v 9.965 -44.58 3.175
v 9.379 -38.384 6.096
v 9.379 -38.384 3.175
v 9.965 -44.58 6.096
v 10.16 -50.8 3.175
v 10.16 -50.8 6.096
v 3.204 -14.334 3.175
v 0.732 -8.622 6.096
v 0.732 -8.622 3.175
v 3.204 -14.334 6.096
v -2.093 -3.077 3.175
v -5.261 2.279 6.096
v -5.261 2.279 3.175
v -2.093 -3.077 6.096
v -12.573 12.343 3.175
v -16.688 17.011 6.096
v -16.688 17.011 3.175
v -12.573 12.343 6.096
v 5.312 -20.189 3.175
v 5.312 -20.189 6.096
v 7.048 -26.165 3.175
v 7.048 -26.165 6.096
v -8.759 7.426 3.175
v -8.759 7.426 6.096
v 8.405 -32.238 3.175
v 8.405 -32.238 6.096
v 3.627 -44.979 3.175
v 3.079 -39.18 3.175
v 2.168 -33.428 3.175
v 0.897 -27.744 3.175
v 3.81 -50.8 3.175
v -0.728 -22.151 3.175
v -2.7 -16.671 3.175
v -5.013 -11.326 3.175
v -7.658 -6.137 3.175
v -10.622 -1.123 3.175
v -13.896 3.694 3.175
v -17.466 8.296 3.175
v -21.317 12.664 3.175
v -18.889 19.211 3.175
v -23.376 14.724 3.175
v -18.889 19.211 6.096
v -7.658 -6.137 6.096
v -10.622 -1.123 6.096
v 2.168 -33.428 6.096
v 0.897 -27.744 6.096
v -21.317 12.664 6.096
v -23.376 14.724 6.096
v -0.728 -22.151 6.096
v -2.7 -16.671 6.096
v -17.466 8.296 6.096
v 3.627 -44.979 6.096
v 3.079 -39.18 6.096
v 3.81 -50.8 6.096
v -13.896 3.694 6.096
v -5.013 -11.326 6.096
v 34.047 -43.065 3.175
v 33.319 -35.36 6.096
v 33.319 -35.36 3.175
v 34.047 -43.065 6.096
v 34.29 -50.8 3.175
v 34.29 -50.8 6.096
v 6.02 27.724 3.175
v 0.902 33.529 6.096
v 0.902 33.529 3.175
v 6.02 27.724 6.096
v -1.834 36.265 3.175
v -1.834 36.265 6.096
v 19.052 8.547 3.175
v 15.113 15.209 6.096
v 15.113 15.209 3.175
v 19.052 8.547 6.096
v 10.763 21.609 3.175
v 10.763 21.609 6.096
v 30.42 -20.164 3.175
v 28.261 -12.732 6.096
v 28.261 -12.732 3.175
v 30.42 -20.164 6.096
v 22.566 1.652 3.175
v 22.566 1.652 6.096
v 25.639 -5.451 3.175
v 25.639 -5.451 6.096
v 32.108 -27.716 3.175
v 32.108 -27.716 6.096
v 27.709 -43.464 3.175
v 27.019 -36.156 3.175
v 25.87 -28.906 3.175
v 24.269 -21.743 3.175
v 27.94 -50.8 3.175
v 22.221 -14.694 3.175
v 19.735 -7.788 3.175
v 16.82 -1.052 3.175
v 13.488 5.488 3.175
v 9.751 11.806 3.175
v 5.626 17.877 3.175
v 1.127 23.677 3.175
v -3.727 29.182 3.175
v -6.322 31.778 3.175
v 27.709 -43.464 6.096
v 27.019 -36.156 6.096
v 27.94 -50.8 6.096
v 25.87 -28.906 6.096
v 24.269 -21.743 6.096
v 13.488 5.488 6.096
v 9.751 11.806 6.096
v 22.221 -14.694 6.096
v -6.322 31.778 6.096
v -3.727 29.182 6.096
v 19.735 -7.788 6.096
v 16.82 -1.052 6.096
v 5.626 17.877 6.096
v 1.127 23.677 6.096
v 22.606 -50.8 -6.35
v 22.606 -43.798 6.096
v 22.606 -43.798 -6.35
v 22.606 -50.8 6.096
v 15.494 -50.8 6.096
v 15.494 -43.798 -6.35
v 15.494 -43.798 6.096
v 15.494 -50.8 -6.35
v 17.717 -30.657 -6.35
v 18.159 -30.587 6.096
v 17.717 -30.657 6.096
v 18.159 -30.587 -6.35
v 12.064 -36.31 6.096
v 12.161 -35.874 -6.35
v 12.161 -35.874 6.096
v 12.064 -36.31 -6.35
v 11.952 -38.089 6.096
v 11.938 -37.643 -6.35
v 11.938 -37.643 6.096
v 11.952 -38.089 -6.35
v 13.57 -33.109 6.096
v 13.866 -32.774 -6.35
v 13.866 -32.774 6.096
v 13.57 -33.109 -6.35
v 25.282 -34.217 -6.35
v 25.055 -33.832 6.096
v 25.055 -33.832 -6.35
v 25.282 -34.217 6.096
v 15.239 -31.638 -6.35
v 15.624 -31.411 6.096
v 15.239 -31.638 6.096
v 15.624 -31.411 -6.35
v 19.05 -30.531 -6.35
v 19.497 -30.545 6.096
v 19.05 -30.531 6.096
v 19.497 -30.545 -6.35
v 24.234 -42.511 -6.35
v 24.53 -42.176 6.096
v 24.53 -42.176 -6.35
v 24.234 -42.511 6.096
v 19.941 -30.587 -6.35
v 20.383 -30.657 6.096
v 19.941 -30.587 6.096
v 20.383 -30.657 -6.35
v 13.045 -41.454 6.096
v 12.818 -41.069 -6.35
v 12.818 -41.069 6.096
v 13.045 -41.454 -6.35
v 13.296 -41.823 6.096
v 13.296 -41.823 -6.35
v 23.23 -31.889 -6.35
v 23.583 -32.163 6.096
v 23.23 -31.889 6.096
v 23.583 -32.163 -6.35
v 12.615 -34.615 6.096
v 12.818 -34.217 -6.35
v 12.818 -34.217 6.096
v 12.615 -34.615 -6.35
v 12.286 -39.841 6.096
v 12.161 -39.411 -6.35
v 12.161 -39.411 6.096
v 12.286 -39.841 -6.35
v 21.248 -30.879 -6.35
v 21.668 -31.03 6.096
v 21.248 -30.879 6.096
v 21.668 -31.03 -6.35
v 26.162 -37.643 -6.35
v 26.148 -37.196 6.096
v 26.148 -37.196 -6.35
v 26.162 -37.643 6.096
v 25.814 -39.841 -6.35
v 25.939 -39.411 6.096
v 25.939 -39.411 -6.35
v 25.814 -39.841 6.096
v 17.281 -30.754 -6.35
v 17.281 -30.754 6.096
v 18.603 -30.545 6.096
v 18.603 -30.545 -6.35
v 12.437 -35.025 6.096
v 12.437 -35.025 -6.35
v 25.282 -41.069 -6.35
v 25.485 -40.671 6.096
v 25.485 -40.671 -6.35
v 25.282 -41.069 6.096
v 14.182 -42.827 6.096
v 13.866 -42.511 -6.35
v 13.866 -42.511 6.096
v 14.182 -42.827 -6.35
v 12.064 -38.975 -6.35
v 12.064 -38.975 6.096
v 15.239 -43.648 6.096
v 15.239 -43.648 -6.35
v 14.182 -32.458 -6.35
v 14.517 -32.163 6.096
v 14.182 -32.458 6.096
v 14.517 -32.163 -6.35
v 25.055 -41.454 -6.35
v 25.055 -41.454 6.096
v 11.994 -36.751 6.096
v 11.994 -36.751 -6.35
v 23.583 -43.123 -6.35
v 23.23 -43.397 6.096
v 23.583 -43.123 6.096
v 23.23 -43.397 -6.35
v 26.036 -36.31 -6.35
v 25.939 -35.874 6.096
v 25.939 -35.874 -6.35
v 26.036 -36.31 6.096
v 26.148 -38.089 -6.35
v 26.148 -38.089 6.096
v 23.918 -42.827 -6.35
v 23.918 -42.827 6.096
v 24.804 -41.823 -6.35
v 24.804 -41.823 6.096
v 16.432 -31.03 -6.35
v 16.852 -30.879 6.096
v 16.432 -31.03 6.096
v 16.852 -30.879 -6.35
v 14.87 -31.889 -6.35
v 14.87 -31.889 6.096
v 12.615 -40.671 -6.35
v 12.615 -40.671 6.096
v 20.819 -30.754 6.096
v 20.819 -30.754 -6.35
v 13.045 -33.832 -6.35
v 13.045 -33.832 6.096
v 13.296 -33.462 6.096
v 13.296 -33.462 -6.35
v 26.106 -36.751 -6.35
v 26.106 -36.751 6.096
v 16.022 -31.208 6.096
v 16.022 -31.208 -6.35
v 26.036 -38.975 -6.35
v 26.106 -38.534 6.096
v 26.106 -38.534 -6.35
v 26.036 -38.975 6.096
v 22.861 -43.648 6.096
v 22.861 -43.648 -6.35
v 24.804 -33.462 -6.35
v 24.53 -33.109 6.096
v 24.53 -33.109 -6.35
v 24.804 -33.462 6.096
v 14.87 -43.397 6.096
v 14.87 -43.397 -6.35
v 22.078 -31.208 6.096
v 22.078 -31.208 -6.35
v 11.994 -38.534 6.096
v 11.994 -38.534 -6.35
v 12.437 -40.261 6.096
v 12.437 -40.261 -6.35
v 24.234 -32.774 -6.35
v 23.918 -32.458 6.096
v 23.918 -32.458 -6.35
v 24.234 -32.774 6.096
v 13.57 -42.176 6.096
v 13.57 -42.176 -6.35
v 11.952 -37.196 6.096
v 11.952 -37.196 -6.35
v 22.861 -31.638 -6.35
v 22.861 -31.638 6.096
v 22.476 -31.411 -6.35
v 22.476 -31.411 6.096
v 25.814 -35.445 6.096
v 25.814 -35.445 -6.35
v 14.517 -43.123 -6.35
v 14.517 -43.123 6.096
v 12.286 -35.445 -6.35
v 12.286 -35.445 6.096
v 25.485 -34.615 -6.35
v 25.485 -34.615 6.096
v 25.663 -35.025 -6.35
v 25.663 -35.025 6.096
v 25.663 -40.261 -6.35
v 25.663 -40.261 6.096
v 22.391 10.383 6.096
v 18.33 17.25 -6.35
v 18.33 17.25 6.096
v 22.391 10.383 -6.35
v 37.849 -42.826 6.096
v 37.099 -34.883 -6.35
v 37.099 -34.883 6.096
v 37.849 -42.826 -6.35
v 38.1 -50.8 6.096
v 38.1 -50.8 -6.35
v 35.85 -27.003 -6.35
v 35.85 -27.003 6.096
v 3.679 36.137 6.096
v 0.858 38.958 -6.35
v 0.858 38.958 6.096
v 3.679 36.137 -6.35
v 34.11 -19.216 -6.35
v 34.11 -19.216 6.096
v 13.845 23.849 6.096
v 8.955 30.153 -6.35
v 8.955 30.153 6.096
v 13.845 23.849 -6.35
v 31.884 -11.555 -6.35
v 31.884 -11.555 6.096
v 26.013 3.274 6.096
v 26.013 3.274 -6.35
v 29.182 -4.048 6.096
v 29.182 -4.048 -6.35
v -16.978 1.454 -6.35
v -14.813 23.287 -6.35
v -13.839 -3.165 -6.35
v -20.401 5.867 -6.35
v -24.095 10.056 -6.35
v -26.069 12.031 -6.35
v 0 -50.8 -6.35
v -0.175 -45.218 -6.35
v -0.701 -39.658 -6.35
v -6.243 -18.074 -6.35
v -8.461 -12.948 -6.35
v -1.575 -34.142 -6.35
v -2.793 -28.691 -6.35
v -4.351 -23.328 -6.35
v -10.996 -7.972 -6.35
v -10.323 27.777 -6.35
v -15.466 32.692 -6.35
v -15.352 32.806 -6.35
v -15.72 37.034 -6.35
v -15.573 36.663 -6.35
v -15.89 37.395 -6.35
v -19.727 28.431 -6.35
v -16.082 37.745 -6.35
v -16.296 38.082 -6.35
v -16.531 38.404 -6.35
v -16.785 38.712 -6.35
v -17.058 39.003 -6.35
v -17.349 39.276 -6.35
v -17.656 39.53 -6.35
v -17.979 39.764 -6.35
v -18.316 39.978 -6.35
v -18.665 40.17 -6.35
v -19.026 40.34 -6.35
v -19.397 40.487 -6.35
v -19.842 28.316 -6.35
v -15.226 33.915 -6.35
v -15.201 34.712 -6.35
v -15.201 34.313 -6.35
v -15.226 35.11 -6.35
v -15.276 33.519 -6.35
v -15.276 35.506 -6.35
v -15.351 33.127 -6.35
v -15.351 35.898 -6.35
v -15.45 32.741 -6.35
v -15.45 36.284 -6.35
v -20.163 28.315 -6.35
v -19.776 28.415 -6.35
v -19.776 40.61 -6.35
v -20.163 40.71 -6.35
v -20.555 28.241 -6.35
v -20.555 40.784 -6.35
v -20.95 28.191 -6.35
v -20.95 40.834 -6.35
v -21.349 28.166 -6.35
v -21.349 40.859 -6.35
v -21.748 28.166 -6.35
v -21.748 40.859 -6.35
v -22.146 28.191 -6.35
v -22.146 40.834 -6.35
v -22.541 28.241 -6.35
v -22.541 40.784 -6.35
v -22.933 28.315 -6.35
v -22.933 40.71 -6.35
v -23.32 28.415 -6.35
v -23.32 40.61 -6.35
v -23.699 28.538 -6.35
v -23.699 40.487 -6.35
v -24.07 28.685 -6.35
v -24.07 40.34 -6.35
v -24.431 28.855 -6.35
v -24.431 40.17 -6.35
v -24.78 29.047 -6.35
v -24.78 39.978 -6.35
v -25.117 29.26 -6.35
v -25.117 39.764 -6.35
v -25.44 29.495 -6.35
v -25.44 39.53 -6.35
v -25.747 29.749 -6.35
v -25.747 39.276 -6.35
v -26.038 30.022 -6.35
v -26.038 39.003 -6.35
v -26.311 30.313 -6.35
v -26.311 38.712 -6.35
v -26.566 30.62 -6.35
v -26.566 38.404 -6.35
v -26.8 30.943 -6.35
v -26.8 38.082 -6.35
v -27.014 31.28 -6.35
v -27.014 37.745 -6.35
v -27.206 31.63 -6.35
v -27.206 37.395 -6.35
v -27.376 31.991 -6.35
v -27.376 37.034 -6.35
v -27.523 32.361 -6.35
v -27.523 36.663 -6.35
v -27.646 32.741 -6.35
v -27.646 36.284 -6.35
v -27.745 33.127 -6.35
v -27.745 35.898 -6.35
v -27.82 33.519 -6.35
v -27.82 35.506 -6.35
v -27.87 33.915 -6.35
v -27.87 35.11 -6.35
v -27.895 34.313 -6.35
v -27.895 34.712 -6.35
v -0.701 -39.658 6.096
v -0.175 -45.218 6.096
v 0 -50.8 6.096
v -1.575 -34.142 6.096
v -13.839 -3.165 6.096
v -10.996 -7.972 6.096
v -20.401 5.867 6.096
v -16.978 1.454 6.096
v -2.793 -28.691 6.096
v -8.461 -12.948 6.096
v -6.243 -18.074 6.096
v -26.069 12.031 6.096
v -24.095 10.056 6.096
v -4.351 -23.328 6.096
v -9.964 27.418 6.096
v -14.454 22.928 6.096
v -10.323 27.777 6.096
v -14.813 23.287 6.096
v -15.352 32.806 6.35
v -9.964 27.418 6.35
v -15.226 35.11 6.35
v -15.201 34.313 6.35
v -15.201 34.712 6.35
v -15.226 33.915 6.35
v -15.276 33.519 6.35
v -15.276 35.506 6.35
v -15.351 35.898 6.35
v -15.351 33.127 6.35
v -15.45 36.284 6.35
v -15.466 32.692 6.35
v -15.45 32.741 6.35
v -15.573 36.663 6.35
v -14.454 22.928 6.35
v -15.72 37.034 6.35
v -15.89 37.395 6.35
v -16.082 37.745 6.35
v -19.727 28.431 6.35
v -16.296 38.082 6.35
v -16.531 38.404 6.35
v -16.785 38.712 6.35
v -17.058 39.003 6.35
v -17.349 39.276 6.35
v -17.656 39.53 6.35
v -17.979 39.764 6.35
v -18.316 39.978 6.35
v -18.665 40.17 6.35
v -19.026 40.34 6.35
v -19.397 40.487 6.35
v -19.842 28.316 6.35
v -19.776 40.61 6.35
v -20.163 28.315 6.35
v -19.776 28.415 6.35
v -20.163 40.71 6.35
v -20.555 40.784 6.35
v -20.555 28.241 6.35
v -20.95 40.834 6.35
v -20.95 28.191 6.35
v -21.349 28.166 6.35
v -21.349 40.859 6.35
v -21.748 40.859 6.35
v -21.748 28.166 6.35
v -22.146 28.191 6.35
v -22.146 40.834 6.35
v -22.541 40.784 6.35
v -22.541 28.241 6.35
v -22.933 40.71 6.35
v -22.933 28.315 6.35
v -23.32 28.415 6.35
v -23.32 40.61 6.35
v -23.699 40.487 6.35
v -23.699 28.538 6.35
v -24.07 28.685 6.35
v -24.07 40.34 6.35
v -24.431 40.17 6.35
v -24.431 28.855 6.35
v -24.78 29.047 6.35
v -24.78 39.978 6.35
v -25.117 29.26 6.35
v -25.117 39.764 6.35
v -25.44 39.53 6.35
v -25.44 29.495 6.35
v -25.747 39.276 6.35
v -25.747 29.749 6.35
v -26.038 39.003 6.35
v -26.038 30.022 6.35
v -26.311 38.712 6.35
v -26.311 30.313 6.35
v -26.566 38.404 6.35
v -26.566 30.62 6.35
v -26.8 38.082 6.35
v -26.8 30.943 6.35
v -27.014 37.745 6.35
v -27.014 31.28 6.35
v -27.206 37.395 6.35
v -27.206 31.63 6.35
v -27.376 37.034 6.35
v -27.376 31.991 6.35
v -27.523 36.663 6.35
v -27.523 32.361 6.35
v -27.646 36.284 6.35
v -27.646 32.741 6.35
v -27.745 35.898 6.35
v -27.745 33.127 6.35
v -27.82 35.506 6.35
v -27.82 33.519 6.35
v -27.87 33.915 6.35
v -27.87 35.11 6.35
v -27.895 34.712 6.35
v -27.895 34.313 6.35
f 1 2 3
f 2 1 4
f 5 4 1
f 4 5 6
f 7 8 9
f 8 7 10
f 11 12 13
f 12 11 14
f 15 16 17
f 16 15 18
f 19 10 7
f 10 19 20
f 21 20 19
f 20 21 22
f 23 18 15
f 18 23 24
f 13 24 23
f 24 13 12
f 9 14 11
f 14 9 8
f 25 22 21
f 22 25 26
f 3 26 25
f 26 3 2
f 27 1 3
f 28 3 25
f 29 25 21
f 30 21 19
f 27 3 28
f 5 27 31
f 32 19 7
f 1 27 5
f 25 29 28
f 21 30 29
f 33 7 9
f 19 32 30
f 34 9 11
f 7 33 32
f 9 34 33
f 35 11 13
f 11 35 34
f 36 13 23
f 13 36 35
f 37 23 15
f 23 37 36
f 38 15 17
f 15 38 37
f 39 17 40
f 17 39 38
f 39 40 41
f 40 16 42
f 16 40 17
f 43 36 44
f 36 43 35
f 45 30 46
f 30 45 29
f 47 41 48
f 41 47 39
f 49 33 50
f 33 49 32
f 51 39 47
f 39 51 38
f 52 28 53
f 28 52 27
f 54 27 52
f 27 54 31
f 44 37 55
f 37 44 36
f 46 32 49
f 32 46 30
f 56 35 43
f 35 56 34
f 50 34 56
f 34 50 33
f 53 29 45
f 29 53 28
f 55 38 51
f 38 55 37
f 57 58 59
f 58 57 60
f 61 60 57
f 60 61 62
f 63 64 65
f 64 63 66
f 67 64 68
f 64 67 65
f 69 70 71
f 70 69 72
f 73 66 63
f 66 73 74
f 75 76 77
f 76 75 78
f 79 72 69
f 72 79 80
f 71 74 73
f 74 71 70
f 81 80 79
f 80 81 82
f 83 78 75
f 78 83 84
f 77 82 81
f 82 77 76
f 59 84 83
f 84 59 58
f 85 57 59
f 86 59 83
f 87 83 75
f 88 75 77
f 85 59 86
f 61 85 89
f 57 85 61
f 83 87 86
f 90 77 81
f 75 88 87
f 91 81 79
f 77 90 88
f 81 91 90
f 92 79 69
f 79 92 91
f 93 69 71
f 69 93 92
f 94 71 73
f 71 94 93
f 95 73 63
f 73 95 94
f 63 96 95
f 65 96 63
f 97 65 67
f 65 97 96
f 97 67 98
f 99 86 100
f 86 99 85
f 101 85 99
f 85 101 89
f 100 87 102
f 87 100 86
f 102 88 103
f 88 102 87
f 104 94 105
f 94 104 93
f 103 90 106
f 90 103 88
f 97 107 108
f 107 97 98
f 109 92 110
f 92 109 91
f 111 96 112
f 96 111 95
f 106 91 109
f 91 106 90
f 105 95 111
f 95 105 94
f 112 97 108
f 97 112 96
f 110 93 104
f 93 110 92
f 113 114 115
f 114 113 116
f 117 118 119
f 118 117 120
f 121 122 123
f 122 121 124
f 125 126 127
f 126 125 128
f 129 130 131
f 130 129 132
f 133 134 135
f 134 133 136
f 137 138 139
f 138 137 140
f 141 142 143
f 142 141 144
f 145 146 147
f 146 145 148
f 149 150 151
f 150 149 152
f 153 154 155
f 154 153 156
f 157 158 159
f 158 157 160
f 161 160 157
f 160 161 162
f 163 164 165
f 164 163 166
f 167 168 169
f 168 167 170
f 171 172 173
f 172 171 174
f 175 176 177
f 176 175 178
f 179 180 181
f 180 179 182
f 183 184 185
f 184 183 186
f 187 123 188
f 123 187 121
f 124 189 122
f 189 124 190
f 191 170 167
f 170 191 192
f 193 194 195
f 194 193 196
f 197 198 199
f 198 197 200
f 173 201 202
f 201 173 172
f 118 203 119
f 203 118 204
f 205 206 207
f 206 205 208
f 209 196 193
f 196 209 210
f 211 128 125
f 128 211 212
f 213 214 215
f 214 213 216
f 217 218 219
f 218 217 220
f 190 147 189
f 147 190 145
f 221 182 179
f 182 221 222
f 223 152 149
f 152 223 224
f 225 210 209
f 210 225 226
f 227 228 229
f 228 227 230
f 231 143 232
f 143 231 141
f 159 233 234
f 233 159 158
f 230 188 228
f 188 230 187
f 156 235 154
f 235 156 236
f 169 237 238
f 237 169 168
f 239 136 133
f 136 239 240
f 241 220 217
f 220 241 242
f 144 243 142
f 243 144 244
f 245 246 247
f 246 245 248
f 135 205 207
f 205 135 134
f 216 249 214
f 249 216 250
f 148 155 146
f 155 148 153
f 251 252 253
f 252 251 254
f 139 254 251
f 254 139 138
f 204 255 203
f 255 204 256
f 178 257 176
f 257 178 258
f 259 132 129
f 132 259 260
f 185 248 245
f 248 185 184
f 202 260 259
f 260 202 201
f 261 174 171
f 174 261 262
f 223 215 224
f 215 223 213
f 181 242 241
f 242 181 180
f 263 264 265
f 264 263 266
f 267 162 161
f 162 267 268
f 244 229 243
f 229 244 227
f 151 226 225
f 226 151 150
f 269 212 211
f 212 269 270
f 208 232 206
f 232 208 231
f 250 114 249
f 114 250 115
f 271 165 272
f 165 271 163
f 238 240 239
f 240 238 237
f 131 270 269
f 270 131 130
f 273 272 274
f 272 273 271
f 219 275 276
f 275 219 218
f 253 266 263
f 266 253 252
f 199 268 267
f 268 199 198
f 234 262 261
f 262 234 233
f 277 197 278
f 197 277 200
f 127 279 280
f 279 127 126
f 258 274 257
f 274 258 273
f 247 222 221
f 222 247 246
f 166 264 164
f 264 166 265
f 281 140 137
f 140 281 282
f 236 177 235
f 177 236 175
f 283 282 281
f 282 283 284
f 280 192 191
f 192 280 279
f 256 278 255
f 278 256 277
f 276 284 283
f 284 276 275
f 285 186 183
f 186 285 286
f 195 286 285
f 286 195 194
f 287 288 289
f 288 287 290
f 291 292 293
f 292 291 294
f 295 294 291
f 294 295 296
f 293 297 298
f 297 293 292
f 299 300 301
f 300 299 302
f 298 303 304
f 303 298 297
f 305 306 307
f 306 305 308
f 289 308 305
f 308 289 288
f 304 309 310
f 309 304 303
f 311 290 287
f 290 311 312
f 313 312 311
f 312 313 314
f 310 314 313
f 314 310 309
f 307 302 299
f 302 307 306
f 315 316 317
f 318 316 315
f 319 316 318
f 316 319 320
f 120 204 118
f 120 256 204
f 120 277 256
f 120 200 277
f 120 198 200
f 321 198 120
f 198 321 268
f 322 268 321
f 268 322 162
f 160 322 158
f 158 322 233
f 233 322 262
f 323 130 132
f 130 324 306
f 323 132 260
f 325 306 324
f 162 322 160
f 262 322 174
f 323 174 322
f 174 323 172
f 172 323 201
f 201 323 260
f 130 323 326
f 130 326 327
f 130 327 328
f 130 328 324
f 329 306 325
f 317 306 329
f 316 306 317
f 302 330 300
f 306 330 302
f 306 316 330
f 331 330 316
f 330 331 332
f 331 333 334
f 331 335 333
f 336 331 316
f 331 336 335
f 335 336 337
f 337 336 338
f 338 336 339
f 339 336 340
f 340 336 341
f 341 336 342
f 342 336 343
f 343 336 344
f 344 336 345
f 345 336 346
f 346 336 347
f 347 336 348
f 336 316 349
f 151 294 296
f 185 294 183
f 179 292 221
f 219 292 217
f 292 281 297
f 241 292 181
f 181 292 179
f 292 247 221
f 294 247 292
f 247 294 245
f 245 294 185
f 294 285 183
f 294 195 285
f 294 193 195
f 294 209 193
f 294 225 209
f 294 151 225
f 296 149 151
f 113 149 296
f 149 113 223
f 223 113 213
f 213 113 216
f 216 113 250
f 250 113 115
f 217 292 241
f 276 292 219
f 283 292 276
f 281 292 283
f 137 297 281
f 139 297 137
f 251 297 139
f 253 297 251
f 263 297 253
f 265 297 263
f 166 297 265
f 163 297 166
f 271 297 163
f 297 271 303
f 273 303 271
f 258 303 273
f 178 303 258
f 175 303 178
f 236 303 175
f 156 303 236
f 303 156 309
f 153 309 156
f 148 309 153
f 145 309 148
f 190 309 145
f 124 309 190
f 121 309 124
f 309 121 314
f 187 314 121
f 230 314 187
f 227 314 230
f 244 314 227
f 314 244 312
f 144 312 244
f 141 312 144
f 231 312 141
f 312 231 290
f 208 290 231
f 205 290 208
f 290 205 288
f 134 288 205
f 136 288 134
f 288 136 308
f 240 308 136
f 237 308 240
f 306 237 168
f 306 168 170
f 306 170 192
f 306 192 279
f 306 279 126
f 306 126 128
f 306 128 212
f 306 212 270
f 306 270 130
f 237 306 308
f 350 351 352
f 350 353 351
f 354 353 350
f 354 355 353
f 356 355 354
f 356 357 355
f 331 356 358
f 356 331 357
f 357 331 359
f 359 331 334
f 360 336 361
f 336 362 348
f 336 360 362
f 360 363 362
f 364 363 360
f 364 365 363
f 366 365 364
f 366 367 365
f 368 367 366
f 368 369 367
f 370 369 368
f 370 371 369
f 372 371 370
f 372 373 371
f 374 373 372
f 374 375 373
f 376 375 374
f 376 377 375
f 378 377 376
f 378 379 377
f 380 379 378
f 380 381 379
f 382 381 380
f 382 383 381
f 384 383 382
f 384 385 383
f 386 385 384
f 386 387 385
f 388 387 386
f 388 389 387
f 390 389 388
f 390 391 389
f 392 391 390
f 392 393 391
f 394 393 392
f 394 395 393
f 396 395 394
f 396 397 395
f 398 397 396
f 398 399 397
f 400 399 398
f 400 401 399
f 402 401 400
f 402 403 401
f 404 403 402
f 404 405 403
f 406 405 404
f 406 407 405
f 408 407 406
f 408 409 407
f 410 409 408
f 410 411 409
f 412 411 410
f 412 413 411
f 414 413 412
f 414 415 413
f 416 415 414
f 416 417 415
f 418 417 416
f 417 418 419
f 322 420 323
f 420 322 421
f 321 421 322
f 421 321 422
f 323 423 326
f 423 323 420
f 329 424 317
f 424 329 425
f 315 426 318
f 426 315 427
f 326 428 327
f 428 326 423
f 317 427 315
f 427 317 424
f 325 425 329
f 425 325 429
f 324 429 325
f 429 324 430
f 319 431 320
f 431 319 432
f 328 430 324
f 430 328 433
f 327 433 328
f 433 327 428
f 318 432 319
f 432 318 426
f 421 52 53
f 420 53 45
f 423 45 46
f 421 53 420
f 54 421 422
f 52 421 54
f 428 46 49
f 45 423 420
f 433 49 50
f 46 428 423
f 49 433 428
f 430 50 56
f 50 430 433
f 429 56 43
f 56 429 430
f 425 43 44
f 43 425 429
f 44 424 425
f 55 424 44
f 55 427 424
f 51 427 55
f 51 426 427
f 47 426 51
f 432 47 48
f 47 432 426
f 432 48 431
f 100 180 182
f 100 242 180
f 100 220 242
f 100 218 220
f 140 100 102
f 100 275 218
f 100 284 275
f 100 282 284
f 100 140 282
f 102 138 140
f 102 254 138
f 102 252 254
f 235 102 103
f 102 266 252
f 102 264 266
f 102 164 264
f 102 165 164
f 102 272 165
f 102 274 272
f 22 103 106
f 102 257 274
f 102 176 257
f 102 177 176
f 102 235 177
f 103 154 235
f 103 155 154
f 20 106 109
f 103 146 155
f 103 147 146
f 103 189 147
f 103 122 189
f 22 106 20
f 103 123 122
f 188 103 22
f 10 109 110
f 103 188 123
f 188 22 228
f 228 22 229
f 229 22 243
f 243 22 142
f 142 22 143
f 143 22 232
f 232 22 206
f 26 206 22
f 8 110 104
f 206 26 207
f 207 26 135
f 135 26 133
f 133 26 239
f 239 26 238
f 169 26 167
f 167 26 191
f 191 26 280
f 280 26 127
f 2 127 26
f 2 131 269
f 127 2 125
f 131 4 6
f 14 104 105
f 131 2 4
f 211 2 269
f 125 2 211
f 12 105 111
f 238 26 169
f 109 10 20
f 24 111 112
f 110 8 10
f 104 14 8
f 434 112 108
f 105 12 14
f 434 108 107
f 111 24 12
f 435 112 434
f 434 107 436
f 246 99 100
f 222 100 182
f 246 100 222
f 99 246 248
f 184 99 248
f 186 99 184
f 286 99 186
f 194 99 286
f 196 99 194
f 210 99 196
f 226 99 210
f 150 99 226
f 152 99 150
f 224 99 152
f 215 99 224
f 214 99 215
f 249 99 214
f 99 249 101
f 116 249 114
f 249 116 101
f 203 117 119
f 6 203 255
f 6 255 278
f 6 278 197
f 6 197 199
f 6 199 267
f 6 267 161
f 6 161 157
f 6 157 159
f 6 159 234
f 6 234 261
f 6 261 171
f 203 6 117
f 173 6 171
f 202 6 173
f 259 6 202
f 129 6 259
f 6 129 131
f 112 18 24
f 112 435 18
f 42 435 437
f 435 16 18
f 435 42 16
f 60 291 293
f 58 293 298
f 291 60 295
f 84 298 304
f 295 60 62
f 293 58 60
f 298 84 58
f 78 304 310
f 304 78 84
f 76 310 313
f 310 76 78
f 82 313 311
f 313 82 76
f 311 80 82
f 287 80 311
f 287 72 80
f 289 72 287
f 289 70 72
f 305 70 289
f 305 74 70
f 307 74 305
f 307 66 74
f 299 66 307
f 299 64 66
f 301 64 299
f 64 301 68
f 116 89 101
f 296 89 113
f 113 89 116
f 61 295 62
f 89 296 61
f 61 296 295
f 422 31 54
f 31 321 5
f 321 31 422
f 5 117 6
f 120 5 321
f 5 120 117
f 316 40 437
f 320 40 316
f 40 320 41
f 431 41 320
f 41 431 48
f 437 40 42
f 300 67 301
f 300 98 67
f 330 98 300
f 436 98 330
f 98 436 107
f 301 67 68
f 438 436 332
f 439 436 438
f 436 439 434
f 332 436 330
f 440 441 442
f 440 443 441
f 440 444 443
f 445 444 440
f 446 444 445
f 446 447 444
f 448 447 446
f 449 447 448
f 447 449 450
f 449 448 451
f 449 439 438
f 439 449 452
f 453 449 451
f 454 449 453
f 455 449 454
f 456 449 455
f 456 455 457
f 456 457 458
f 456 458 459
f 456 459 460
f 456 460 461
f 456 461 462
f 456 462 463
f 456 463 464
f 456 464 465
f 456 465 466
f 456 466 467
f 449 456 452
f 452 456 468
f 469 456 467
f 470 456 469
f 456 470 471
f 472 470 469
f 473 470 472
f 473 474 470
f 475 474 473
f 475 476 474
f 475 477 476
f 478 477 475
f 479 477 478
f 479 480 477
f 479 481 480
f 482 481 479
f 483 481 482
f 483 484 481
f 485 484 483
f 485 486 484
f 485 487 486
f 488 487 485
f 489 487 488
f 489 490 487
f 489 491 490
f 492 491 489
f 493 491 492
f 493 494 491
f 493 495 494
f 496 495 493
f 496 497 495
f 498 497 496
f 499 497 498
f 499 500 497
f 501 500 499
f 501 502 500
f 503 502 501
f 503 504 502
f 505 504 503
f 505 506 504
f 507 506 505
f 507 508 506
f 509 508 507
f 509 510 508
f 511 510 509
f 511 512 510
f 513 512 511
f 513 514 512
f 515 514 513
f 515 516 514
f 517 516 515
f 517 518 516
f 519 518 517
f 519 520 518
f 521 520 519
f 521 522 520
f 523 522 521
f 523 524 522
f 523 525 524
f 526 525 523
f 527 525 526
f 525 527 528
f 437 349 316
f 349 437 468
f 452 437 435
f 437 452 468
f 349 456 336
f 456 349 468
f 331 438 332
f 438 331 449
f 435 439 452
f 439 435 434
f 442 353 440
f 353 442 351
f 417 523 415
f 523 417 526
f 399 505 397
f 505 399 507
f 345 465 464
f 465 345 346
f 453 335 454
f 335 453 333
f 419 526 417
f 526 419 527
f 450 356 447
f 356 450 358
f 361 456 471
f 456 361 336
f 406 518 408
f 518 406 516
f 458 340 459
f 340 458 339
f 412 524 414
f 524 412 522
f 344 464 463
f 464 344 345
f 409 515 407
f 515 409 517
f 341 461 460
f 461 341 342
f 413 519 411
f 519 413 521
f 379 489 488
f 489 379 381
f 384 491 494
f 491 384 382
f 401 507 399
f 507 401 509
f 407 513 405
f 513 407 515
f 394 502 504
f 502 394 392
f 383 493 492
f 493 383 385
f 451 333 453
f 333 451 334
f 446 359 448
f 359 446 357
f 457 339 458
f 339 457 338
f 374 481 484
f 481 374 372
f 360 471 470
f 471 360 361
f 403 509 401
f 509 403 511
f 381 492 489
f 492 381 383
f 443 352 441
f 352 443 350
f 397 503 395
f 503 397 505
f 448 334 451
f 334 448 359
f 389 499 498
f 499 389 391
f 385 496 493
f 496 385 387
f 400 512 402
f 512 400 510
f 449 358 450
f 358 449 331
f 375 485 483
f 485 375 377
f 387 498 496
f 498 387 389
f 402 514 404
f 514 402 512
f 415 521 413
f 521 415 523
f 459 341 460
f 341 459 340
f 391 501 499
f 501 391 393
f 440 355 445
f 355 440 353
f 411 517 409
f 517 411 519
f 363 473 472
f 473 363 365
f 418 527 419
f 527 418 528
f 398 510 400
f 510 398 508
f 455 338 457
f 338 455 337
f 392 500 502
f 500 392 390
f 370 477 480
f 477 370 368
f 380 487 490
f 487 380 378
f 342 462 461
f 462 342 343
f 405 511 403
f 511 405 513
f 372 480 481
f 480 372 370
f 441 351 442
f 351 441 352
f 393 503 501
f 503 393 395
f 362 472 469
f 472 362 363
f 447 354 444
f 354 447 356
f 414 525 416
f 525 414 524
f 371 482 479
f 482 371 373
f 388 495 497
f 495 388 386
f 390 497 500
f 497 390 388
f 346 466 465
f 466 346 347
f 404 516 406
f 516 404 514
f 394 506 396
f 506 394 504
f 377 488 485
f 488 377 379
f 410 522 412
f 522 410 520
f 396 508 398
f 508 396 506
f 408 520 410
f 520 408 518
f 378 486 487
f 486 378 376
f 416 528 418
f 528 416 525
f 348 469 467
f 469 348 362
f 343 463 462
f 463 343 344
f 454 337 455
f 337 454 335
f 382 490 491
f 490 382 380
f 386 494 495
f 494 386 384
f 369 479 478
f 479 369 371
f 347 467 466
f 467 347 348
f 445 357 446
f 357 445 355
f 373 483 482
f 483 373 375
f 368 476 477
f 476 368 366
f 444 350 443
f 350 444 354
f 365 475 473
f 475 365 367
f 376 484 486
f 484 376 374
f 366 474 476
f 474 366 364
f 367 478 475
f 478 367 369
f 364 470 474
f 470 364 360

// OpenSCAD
// file: tracks_lib.scad
function inches(in) = in*25.4;

module outie_connector(z) {
  union() {
   cube([inches(0.25),inches(0.3),z], center=true);
   translate([0,inches(0.37),0]) {
    rotate([0,0,90]) cylinder(h=inches(0.50),r=inches(0.25),center=true,$fn=100); 
   }
  }
}

module innie_connector(z) {
  union() {
   cube([inches(0.28),inches(0.3),z], center=true);
   translate([0,inches(0.37),0]) {
    rotate([0,0,90]) cylinder(h=inches(0.51),r=inches(0.28),center=true,$fn=100); 
   }
  }
}
// main file
use <tracks_lib.scad>

module triangle_block(len) {
  color([28,28,0,1])
    difference() {
      cube(size=[len,len,inches(0.5)], center=false);
      translate([0,0,-0.1]) rotate([0,0,45]) cube(size=[len*2,len*2,inches(0.55)], center=false);
    }
}

module curved_rail(radius) {
  //color([255,0,0,0.8])
  difference() {
    cylinder(h=inches(0.13), r=radius, center=true,$fn=100);
    cylinder(h=inches(0.131), r=(radius-inches(0.25)), center=true,$fn=100);
  }
}

module curved_track() {
  union() {
    intersection() {
      difference() {
        cylinder(h=inches(0.5), r=inches(5), center=true,$fn=100);
        cylinder(h=inches(0.51), r=inches(3.5), center=true,$fn=100);

        translate([0,0,inches(0.19)]) {
          curved_rail(inches(3.9));
          curved_rail(inches(4.85));
        }

        translate([inches(4.25),inches(0.148),0]) {
          innie_connector(inches(0.6));
        }
      }
      translate([0,0,inches(-0.26)]) {
        triangle_block(inches(7));
      }
    }

    rotate([0,0,45]) translate([inches(4.25),inches(0.13),0]) {
       outie_connector(inches(0.5));
    }

  }
}

translate([inches(-3.5),inches(-2),0]) curved_track();
